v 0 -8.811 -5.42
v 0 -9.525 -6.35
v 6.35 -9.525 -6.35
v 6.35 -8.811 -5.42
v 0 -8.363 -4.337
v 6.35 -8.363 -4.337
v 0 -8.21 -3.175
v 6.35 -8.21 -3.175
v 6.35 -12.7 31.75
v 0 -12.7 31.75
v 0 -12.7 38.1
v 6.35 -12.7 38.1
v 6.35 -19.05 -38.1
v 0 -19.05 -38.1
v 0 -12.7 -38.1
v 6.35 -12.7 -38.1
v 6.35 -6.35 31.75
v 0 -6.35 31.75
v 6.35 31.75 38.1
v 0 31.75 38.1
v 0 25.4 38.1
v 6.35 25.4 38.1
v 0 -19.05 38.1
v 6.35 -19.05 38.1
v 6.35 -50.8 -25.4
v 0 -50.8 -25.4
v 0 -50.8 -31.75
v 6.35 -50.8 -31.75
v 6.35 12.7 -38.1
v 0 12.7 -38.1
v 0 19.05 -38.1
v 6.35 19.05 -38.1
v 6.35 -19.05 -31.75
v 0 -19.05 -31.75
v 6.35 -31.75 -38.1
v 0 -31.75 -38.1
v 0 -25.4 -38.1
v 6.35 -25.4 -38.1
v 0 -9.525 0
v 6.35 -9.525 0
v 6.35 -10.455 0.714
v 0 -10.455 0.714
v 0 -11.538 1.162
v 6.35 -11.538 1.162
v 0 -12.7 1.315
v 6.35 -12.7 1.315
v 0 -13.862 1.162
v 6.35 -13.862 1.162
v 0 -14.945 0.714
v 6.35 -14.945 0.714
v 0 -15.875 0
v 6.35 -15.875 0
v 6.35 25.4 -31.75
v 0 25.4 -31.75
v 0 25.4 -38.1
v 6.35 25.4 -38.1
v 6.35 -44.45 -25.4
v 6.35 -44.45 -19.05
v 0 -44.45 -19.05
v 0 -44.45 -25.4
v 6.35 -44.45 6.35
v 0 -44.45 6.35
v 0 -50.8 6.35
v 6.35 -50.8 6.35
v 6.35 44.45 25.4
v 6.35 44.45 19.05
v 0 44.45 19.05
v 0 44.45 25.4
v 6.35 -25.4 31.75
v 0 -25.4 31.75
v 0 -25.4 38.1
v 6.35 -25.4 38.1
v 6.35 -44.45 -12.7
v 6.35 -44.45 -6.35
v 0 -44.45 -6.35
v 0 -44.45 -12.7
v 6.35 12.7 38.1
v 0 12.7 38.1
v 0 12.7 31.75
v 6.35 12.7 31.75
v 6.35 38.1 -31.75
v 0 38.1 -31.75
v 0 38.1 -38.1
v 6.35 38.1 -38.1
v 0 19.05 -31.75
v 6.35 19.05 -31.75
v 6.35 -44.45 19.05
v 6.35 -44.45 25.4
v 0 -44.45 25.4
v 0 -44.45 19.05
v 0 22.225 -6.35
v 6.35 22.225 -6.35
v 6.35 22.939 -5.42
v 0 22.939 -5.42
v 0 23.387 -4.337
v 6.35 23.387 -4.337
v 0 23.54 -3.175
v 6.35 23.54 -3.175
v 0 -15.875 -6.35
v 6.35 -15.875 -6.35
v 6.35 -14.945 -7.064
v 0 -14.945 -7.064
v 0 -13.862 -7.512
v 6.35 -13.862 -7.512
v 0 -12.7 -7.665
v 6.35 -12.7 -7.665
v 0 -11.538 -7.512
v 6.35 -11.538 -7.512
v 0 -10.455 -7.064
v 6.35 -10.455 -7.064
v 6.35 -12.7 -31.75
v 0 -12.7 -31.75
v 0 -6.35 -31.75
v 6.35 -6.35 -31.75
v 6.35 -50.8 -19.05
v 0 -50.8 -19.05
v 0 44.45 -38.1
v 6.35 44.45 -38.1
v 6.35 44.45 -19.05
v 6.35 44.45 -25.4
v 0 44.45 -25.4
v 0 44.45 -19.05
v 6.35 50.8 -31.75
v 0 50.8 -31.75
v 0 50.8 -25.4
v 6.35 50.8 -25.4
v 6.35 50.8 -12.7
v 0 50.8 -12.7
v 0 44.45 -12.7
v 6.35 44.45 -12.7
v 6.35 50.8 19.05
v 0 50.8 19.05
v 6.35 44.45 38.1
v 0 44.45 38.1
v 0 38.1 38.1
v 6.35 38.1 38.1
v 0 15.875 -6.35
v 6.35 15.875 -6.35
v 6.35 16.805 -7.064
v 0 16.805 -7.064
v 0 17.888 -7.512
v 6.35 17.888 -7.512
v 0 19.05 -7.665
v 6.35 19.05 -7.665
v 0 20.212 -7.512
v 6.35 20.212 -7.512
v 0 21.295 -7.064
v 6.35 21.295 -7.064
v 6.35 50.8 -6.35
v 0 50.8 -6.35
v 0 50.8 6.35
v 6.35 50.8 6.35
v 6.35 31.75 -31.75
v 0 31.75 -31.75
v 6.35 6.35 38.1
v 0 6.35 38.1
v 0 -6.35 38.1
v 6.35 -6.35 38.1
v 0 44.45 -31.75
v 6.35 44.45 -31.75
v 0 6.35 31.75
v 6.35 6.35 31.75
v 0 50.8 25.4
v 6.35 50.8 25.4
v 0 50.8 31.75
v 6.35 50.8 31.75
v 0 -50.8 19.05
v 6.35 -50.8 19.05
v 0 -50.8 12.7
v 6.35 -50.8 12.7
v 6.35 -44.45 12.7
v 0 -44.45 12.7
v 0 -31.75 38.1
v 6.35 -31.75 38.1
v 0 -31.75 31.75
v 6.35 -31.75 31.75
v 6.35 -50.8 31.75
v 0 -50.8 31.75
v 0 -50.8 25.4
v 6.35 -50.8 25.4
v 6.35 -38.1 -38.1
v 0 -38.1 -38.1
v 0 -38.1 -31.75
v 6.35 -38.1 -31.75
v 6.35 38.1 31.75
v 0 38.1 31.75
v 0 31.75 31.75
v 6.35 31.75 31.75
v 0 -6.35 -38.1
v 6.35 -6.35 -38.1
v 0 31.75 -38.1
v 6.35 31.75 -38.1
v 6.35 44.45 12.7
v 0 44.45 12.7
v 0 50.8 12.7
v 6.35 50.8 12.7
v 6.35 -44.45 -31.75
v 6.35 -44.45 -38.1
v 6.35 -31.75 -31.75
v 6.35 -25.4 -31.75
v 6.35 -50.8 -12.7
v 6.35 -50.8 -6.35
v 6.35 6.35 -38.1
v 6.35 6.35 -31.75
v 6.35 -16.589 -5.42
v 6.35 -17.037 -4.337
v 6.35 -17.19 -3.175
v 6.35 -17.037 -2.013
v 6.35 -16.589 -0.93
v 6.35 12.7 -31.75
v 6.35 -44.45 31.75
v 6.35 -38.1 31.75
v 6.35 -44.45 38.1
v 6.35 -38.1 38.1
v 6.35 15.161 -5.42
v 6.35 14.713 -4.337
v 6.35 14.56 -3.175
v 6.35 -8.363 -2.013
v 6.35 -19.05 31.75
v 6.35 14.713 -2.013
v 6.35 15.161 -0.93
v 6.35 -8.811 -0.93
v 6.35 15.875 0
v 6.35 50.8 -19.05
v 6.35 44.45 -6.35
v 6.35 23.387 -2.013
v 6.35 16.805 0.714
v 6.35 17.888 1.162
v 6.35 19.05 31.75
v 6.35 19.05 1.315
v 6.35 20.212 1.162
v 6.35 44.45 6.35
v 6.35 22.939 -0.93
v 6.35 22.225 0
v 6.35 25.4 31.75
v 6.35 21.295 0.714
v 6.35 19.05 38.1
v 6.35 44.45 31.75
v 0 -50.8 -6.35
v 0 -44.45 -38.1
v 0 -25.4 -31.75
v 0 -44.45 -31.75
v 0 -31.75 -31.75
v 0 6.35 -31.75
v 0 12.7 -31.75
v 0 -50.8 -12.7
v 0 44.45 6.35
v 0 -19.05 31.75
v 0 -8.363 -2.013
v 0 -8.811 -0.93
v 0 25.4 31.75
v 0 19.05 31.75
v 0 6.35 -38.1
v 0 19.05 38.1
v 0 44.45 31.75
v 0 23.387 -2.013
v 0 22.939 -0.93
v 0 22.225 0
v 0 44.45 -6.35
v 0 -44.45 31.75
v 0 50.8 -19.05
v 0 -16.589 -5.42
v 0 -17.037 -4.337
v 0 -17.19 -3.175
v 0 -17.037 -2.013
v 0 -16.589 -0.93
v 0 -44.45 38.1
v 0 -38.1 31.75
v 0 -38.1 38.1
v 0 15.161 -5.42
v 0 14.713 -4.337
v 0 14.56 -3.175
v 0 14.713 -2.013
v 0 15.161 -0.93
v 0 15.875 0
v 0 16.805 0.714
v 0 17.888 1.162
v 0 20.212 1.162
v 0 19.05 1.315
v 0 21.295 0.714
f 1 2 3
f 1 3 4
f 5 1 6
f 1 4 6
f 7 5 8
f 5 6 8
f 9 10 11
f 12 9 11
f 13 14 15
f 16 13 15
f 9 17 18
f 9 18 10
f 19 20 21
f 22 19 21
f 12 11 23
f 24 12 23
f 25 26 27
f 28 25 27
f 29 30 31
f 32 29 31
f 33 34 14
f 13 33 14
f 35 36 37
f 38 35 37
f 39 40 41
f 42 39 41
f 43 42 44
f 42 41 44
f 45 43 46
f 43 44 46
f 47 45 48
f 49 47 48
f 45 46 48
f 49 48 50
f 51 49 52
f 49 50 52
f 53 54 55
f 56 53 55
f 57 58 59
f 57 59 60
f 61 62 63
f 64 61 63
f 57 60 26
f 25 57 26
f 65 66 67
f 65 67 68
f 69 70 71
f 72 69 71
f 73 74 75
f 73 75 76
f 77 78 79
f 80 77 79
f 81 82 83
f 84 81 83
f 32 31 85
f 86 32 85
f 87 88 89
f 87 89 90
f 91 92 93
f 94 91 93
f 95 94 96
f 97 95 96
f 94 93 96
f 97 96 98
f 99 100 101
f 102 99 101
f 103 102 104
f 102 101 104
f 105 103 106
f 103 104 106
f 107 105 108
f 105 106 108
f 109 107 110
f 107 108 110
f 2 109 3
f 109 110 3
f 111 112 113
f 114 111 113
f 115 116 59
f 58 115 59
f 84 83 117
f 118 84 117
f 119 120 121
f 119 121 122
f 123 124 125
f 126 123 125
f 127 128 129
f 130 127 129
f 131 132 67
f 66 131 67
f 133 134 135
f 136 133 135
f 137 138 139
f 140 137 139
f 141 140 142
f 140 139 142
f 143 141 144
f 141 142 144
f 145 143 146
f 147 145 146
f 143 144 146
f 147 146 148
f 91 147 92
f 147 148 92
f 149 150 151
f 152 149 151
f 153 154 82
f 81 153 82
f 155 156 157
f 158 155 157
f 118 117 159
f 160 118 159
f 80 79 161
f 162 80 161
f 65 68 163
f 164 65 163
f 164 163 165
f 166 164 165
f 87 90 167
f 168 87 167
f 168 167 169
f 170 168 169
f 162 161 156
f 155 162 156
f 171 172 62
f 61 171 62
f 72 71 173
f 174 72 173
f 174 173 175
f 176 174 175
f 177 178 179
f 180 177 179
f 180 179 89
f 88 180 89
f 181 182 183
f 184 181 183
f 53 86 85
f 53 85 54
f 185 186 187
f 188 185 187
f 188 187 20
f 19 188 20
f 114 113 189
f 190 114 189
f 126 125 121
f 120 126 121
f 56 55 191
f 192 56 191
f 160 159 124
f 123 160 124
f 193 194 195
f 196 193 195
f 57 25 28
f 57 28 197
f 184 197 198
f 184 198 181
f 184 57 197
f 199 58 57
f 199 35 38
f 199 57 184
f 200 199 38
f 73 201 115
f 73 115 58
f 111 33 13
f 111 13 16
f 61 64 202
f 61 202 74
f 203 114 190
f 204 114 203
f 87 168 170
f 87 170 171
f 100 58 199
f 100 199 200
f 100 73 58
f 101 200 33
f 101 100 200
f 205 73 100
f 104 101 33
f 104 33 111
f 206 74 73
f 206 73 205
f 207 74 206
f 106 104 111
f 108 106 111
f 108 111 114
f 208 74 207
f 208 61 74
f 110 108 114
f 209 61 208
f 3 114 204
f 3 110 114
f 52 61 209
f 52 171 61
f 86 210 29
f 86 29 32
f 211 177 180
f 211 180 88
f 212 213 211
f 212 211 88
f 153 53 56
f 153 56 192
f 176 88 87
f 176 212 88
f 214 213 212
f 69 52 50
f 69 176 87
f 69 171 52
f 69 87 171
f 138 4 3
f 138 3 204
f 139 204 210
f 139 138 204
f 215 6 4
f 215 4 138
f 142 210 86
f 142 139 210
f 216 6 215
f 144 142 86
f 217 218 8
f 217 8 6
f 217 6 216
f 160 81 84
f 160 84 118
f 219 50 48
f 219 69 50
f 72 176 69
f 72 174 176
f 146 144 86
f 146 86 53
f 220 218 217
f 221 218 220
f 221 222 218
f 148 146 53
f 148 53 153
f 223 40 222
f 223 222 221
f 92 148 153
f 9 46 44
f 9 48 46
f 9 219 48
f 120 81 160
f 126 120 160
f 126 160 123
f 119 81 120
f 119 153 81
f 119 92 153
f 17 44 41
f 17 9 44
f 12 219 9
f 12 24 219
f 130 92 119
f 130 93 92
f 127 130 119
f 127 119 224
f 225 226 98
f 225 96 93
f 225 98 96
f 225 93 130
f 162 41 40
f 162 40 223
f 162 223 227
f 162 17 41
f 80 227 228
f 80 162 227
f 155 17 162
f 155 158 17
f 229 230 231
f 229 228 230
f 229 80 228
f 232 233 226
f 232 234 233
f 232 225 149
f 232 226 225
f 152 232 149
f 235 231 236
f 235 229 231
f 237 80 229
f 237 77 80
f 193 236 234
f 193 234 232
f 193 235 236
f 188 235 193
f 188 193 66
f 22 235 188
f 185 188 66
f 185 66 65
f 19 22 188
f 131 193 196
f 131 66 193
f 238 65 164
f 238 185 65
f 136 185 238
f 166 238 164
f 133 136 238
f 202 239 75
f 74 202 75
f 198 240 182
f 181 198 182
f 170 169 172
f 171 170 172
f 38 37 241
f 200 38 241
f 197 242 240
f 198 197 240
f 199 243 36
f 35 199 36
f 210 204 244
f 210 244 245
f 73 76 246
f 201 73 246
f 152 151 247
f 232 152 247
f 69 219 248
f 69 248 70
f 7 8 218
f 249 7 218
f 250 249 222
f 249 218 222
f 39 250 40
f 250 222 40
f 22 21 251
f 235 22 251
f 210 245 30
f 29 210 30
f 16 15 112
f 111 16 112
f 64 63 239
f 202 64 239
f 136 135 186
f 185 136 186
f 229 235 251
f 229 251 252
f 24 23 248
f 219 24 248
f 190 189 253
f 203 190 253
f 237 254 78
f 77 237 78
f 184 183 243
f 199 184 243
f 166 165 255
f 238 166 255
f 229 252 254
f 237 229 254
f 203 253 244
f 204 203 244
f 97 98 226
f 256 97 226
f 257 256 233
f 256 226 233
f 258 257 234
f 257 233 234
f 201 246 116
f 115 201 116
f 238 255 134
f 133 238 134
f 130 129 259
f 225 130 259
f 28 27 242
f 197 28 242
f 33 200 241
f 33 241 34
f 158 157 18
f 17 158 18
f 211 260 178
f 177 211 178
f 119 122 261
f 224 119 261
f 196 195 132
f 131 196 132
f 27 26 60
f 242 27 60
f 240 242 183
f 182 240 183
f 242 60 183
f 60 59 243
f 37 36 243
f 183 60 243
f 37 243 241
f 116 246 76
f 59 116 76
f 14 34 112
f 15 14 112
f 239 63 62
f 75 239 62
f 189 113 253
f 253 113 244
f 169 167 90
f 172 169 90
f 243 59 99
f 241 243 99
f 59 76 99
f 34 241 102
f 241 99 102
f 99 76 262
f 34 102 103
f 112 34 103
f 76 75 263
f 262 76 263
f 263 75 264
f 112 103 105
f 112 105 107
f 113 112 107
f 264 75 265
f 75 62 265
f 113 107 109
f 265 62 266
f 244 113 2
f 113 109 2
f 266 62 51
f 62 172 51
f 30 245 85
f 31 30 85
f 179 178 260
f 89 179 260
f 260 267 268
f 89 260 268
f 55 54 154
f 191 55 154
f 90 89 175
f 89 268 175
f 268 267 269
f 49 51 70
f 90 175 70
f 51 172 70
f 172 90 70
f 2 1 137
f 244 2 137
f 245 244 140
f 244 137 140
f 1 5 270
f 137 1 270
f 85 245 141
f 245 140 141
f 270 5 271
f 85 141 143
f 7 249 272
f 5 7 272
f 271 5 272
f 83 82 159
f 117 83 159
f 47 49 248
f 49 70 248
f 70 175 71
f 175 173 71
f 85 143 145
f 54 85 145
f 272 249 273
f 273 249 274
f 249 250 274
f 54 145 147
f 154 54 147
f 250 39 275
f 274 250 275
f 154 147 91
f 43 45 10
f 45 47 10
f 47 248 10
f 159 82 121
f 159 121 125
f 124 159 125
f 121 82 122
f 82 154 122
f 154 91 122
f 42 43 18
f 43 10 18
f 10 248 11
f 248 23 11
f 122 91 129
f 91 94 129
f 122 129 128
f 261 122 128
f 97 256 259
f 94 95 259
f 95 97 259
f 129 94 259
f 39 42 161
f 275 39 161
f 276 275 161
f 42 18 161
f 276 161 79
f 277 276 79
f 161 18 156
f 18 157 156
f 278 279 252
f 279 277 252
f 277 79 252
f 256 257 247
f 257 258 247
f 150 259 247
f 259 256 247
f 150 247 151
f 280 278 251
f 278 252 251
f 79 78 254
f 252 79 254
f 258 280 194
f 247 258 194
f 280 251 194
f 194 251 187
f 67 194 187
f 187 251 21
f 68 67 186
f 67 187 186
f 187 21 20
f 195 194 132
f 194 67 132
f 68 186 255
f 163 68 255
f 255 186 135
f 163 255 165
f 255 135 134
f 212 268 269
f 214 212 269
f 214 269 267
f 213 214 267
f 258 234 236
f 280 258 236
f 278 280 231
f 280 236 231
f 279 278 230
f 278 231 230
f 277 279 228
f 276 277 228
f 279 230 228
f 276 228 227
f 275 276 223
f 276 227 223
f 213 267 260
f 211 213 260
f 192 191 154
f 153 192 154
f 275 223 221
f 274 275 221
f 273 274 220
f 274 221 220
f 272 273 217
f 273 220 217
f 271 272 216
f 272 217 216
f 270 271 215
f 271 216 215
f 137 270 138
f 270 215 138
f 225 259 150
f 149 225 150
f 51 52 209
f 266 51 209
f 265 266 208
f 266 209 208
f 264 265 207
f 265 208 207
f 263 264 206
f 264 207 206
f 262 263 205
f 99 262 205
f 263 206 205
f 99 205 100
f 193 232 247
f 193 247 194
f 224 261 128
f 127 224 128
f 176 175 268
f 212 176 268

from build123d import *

# Parameters (mm, degrees)
F1_DEPTH = 6.35
F2_W     = 6.35
F2_H     = 6.35
F3_DEPTH = 6.351


with BuildPart() as f1:
    # F0 (on Right) → F1 (new body)
    with BuildSketch(Plane.YZ):
        Polygon((-38.1, 38.1), (-44.45, 38.1), (-44.45, 31.75), (-50.8, 31.75), (-50.8, 25.4), (-44.45, 25.4), (-44.45, 19.05), (-50.8, 19.05), (-50.8, 12.7), (-44.45, 12.7), (-44.45, 6.35), (-50.8, 6.35), (-50.8, 0), (-50.8, -6.35), (-44.45, -6.35), (-44.45, -12.7), (-50.8, -12.7), (-50.8, -19.05), (-44.45, -19.05), (-44.45, -25.4), (-50.8, -25.4), (-50.8, -31.75), (-44.45, -31.75), (-44.45, -38.1), (-38.1, -38.1), (-38.1, -31.75), (-31.75, -31.75), (-31.75, -38.1), (-25.4, -38.1), (-25.4, -31.75), (-19.05, -31.75), (-19.05, -38.1), (-12.7, -38.1), (-12.7, -31.75), (-6.35, -31.75), (-6.35, -38.1), (0, -38.1), (6.35, -38.1), (6.35, -31.75), (12.7, -31.75), (12.7, -38.1), (19.05, -38.1), (19.05, -31.75), (25.4, -31.75), (25.4, -38.1), (31.75, -38.1), (31.75, -31.75), (38.1, -31.75), (38.1, -38.1), (44.45, -38.1), (44.45, -31.75), (50.8, -31.75), (50.8, -25.4), (44.45, -25.4), (44.45, -19.05), (50.8, -19.05), (50.8, -12.7), (44.45, -12.7), (44.45, -6.35), (50.8, -6.35), (50.8, 0), (50.8, 6.35), (44.45, 6.35), (44.45, 12.7), (50.8, 12.7), (50.8, 19.05), (44.45, 19.05), (44.45, 25.4), (50.8, 25.4), (50.8, 31.75), (44.45, 31.75), (44.45, 38.1), (38.1, 38.1), (38.1, 31.75), (31.75, 31.75), (31.75, 38.1), (25.4, 38.1), (25.4, 31.75), (19.05, 31.75), (19.05, 38.1), (12.7, 38.1), (12.7, 31.75), (6.35, 31.75), (6.35, 38.1), (0, 38.1), (-6.35, 38.1), (-6.35, 31.75), (-12.7, 31.75), (-12.7, 38.1), (-19.05, 38.1), (-19.05, 31.75), (-25.4, 31.75), (-25.4, 38.1), (-31.75, 38.1), (-31.75, 31.75), (-38.1, 31.75), align=None)
    extrude(amount=F1_DEPTH)

    # F2 (on face) → F3 (cut, through all)
    with BuildSketch(Plane.YZ.offset(6.35)):
        with BuildLine():
            ThreePointArc((-15.875, -6.35), (-12.7, -7.6651280605), (-9.525, -6.35))
            Line((-9.525, -6.35), (-15.875, -6.35))
        make_face()
        Polygon((-15.875, -6.35), (-9.525, -6.35), (-9.525, -3.175), (-9.525, 0), (-15.875, 0), align=None)
        with BuildLine():
            Line((-9.525, -3.175), (-9.525, -6.35))
            ThreePointArc((-9.525, -6.35), (-8.5516625865, -4.893297618), (-8.2098719395, -3.175))
            ThreePointArc((-8.2098719395, -3.175), (-8.5516625865, -1.456702382), (-9.525, 0))
            Line((-9.525, 0), (-9.525, -3.175))
        make_face()
        with BuildLine():
            ThreePointArc((-15.875, 0), (-17.1901280605, -3.175), (-15.875, -6.35))
            Line((-15.875, -6.35), (-15.875, 0))
        make_face()
        with BuildLine():
            Line((-15.875, 0), (-9.525, 0))
            ThreePointArc((-9.525, 0), (-12.7, 1.3151280605), (-15.875, 0))
        make_face()
        with BuildLine():
            ThreePointArc((22.225, 0), (19.05, 1.3151280605), (15.875, 0))
            Line((15.875, 0), (22.225, 0))
        make_face()
        with Locations((19.05, -3.175)):
            Rectangle(F2_W, F2_H)
        with BuildLine():
            Line((15.875, -6.35), (15.875, 0))
            ThreePointArc((15.875, 0), (14.5598719395, -3.175), (15.875, -6.35))
        make_face()
        with BuildLine():
            ThreePointArc((23.5401280605, -3.175), (23.1983374135, -1.456702382), (22.225, 0))
            Line((22.225, 0), (22.225, -6.35))
            ThreePointArc((22.225, -6.35), (23.1983374135, -4.893297618), (23.5401280605, -3.175))
        make_face()
        with BuildLine():
            Line((22.225, -6.35), (15.875, -6.35))
            ThreePointArc((15.875, -6.35), (19.05, -7.6651280605), (22.225, -6.35))
        make_face()
    extrude(amount=-F3_DEPTH, mode=Mode.SUBTRACT)


solid = f1.part
